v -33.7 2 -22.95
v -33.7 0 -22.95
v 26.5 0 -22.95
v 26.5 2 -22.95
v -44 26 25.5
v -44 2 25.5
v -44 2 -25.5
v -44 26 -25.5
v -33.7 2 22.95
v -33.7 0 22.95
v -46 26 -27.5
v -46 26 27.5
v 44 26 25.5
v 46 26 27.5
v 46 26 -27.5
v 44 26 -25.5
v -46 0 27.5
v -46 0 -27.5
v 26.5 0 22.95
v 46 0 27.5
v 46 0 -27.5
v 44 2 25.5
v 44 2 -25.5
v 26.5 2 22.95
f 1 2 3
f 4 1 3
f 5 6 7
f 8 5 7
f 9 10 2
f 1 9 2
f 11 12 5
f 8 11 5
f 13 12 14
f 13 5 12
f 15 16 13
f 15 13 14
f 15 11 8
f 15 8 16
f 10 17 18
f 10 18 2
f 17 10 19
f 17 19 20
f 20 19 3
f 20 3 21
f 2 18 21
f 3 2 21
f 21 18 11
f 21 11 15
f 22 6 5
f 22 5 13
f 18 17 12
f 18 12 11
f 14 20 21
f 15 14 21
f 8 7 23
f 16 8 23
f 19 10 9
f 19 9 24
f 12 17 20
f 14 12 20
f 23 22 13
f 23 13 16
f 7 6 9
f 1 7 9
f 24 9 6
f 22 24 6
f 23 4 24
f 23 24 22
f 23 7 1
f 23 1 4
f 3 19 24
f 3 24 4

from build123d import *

# Parameters (mm, degrees)
SKETCH1_W           = 88
SKETCH1_H           = 51
BOSS_EXTRUDE1_DEPTH = 2
SKETCH2_W           = 60.2
SKETCH2_H           = 45.9
CUT_EXTRUDE1_DEPTH  = 2
SKETCH3_W           = 92
SKETCH3_H           = 55
SKETCH3_W_2         = 88
SKETCH3_H_2         = 51
BOSS_EXTRUDE2_DEPTH = 26


with BuildPart() as part:
    # Sketch1 → Boss-Extrude1 (new body)
    with BuildSketch(Plane(origin=(0, 0, 0), x_dir=(1, 0, 0), z_dir=(0, 1, 0))):
        Rectangle(SKETCH1_W, SKETCH1_H)
    extrude(amount=BOSS_EXTRUDE1_DEPTH)

    # Sketch2 → Cut-Extrude1 (cut)
    with BuildSketch(Plane(origin=(0, 0, 0), x_dir=(1, 0, 0), z_dir=(0, 1, 0))):
        with Locations((-3.6, 0)):
            Rectangle(SKETCH2_W, SKETCH2_H)
    extrude(amount=CUT_EXTRUDE1_DEPTH, mode=Mode.SUBTRACT)

    # Sketch3 → Boss-Extrude2 (add)
    with BuildSketch(Plane(origin=(0, 0, 0), x_dir=(1, 0, 0), z_dir=(0, 1, 0))):
        Rectangle(SKETCH3_W, SKETCH3_H)
        Rectangle(SKETCH3_W_2, SKETCH3_H_2, mode=Mode.SUBTRACT)
    extrude(amount=BOSS_EXTRUDE2_DEPTH)


solid = part.part
